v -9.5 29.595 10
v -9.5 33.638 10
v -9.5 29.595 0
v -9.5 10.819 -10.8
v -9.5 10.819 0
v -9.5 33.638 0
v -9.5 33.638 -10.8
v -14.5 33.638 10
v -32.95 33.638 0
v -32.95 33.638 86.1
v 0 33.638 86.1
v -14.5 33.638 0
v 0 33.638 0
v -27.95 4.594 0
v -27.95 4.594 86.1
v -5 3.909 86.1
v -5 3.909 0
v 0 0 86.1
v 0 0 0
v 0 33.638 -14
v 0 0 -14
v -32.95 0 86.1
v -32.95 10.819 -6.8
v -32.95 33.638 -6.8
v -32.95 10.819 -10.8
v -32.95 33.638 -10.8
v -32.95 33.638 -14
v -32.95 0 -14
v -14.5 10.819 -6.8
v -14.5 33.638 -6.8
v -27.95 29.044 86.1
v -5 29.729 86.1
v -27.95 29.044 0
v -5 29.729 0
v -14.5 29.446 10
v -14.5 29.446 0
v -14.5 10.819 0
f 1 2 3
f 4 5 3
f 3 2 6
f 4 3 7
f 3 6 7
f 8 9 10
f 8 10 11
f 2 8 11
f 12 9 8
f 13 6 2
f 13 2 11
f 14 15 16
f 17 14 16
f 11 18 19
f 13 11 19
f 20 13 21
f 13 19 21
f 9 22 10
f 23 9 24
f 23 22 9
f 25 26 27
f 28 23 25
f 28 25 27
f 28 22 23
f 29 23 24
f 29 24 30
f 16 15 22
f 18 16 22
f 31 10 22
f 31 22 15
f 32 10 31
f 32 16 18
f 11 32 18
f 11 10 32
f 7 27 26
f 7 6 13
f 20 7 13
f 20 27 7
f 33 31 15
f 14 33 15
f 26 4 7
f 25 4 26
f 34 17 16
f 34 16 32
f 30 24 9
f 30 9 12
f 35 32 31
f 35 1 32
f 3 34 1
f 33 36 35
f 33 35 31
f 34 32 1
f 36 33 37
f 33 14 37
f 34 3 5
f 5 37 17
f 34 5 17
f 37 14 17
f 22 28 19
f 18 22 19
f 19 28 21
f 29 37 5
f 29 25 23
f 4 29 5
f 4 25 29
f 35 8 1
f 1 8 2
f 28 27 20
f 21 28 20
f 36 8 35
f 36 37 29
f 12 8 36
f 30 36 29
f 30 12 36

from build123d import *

# Parameters (mm, degrees)
SKETCH2_W               = 32.95
SKETCH2_H               = 33.638015847
BOSS_EXTRUDE1_DEPTH     = 86.1
SKETCH4_W               = 32.95
SKETCH4_H               = 14
BOSS_EXTRUDE3_DEPTH     = 33.63802
CUT_EXTRUDE1_DEPTH      = 27.1
CUT_EXTRUDE1_DEPTH_BACK = 6
CUT_EXTRUDE1_START      = -16.819008
SKETCH5_W               = 5
SKETCH5_H               = 6.8
CUT_EXTRUDE2_REACH      = 100.135
SKETCH6_W               = 5
SKETCH6_H               = 10


with BuildPart() as part:
    # Sketch2 → Boss-Extrude1 (new body)
    with BuildSketch(Plane.XY):
        with Locations((-16.475, 16.819007924)):
            Rectangle(SKETCH2_W, SKETCH2_H)
        Polygon((-5, 3.909007924), (-5, 29.729007924), (-27.95, 29.044167374), (-27.95, 4.593848474), align=None, mode=Mode.SUBTRACT)
    extrude(amount=BOSS_EXTRUDE1_DEPTH)


with BuildPart() as body_2:
    # Sketch4 → Boss-Extrude3 (new body)
    with BuildSketch(Plane(origin=(0, 0, 0), x_dir=(1, 0, 0), z_dir=(0, 1, 0))):
        with Locations((-16.475, 7)):
            Rectangle(SKETCH4_W, SKETCH4_H)
    extrude(amount=BOSS_EXTRUDE3_DEPTH)

    # Sketch5 → Cut-Extrude1 (cut, two sides: drawn at the far end of the back side and taken through both)
    with BuildSketch(Plane(origin=(0, 33.638015847, 0), x_dir=(1, 0, 0), z_dir=(0, 1, 0)).offset(CUT_EXTRUDE1_START - CUT_EXTRUDE1_DEPTH_BACK)):
        with Locations((-12, 3.4)):
            Rectangle(SKETCH5_W, SKETCH5_H)
        Polygon((-14.5, 6.8), (-9.5, 6.8), (-9.5, 7.05), (-9.5, 10.8), (-32.95, 10.8), (-32.95, 6.8), align=None)
    extrude(amount=CUT_EXTRUDE1_DEPTH + CUT_EXTRUDE1_DEPTH_BACK, mode=Mode.SUBTRACT)


with BuildPart() as part_1:
    add(part.part)

    # Combine1: union body 2
    add(body_2.part)

    # Cut-Extrude2: up to this plane
    cut_extrude2_end = Plane(origin=(-27.95, 29.044167374, 86.1), z_dir=(0.029827269826923603, -0.9995550680050959, 0))
    # Sketch6 → Cut-Extrude2 (cut, up to the surface)
    with BuildSketch(Plane(origin=(0, 33.638015847, 0), x_dir=(1, 0, 0), z_dir=(0, 1, 0)), mode=Mode.PRIVATE) as cut_extrude2_sk1:
        with Locations((-12, -5)):
            Rectangle(SKETCH6_W, SKETCH6_H)
    cut_extrude2_tool1 = split(extrude(cut_extrude2_sk1.sketch, amount=-CUT_EXTRUDE2_REACH, mode=Mode.PRIVATE), bisect_by=cut_extrude2_end, keep=Keep.BOTH, mode=Mode.PRIVATE)
    add(cut_extrude2_tool1.solids().sort_by_distance((-12, 33.638016, 5))[0], mode=Mode.SUBTRACT)


solid = part_1.part
